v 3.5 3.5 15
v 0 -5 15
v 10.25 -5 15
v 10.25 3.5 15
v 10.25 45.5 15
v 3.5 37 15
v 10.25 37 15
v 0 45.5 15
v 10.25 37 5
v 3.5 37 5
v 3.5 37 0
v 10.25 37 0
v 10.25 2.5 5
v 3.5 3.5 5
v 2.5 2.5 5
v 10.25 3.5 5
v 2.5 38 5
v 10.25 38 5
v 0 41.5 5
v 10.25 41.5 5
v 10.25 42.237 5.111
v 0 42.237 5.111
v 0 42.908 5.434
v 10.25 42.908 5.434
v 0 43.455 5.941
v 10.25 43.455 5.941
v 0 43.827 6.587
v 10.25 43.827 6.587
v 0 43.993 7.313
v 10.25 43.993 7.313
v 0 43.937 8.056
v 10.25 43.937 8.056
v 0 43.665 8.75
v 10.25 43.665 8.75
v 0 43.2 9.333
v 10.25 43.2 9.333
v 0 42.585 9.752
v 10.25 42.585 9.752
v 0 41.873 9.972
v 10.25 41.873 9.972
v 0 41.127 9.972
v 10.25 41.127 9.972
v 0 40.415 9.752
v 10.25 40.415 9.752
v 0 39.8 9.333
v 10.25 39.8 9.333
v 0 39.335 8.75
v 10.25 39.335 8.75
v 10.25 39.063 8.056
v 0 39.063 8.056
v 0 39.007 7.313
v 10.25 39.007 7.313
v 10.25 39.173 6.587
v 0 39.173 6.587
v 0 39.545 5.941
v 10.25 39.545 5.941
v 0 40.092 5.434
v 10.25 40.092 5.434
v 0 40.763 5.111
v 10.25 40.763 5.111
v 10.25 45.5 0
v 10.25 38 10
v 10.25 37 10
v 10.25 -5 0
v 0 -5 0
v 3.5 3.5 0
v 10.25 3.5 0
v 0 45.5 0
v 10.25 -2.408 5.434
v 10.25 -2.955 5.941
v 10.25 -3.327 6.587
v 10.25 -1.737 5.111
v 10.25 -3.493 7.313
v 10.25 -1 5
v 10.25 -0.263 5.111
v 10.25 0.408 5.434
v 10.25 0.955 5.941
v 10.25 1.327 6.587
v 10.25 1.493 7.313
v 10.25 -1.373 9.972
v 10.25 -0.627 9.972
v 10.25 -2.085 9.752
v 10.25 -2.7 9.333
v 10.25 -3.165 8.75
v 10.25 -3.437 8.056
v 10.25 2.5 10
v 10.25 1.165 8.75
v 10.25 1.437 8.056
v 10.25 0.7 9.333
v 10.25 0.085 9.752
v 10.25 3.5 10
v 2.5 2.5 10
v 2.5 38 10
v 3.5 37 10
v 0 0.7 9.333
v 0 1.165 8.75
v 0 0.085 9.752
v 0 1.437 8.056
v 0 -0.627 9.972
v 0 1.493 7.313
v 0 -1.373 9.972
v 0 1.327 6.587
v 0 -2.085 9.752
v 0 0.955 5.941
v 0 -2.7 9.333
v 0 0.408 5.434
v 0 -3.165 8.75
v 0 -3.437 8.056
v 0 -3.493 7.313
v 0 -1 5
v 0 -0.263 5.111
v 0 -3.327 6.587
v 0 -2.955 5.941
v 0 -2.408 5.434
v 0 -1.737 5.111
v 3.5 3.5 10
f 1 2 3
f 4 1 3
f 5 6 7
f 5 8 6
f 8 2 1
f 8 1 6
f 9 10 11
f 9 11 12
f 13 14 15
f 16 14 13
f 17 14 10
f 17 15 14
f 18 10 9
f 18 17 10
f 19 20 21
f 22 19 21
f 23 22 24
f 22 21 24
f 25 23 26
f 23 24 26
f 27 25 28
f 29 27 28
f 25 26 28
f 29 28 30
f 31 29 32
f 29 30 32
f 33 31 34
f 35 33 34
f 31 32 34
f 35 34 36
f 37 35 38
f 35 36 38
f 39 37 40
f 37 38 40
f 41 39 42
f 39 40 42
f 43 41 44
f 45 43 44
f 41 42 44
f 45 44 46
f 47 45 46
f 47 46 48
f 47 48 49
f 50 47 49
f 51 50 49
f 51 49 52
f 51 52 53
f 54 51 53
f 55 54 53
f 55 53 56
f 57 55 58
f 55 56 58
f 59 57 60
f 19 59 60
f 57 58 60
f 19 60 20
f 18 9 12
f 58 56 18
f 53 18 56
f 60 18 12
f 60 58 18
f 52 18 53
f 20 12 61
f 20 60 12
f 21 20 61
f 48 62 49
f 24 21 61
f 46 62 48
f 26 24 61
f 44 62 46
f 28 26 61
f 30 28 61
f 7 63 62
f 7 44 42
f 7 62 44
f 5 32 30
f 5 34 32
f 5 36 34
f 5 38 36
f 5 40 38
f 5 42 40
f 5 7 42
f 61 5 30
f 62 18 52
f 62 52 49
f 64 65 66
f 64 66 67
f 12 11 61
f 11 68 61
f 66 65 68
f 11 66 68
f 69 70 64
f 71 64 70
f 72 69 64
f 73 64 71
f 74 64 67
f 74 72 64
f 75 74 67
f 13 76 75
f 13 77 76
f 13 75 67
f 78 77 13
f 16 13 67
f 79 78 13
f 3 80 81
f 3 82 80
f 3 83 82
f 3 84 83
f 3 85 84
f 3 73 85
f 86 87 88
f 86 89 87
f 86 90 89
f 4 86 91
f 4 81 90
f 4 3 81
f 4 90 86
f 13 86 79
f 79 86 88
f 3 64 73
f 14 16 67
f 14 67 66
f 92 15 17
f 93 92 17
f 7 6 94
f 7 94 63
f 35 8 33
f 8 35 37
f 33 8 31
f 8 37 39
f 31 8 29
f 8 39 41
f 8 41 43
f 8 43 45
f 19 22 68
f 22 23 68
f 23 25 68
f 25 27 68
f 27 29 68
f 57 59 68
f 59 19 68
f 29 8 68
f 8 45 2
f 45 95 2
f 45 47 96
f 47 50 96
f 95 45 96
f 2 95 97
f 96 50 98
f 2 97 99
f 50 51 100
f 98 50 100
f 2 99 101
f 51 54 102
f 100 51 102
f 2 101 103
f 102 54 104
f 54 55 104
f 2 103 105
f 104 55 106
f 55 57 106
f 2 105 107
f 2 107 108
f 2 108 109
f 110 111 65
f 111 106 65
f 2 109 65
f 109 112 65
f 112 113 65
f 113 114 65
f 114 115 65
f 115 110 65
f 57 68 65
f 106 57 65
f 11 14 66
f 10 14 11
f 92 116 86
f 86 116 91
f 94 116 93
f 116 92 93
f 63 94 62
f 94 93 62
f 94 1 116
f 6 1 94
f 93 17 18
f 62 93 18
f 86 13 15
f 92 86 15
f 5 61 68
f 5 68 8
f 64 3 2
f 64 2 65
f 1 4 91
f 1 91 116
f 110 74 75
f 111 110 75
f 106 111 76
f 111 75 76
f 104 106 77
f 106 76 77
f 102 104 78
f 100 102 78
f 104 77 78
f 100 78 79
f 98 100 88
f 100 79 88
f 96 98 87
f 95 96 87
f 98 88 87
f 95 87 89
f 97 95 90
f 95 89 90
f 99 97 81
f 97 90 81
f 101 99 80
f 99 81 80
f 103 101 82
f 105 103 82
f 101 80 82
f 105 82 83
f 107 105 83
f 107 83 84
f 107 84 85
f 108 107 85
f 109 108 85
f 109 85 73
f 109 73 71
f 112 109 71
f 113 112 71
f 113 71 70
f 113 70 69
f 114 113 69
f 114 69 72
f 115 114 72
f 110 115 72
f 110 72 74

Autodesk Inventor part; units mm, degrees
ref_plane "YZ Plane" through (0, 0, 0) normal (1, 0, 0) x (0, 1, 0)
ref_plane "XZ Plane" through (0, 0, 0) normal (0, 1, 0) x (-1, 0, 0)
sketch "Sketch1" plane through (0, 0, 0) normal (0, 0, 1) x (1, 0, 0)
  line L0 (0, 0) -> (20.25, 0)
  line L1 (20.25, 0) -> (20.25, 40.5)
  line L2 (20.25, 40.5) -> (0, 40.5)
  line L3 (0, 40.5) -> (0, 0)
  dimension "d0" = 40.5
  dimension "d1" = 20.25
extrude "Extrusion1" add sketch "Sketch1" along normal blind 15
sketch "Sketch2" plane through (0, 0, 15) normal (0, 0, 1) x (1, 0, 0)
  line L0 (3.5, 37) -> (20.25, 37)
  line L1 (20.25, 37) -> (20.25, 3.5)
  line L2 (20.25, 3.5) -> (3.5, 3.5)
  line L3 (3.5, 3.5) -> (3.5, 37)
  line L4 (20.25, 0) -> (20.25, 40.5) projected
  line L5 (20.25, 40.5) -> (0, 40.5) projected
  line L6 (0, 0) -> (20.25, 0) projected
  dimension "d4" = 16.75
  dimension "d5" = 3.5
  dimension "d6" = 3.5
extrude "Extrusion2" cut sketch "Sketch2" against normal blind 15
ref_plane "Work Plane1" through (0, 0, 7.5) normal (0, 0, 1) x (1, 0, 0)
sketch "Sketch3" plane through (0, 0, 7.5) normal (0, 0, 1) x (1, 0, 0)
  line L0 (2.5, 38) -> (20.25, 38)
  line L1 (20.25, 38) -> (20.25, 2.5)
  line L2 (20.25, 2.5) -> (2.5, 2.5)
  line L3 (2.5, 2.5) -> (2.5, 38)
  line L4 (20.25, 0) -> (20.25, 3.5) projected
  line L5 (20.25, 40.5) -> (0, 40.5) projected
  line L6 (0, 0) -> (20.25, 0) projected
  line L7 (0, 40.5) -> (0, 0) projected
  dimension "d10" = 2.5
  dimension "d11" = 2.5
  dimension "d12" = 2.5
extrude "Extrusion3" cut sketch "Sketch3" along normal mid plane 5
sketch "Sketch4" plane through (20.25, 40.5, 15) normal (1, 0, 0) x (0, 0, -1)
  line L0 (15, 0) -> (0, 0) projected
  line L1 (0, 0) -> (15, 0)
  line L2 (15, 0) -> (15, 5)
  line L3 (15, 5) -> (0, 5)
  line L4 (0, 5) -> (0, 0)
  line L5 (15, -40.5) -> (15, -37) projected
  line L6 (15, -40.5) -> (0, -40.5)
  line L7 (0, -40.5) -> (0, -45.5)
  line L8 (0, -45.5) -> (15, -45.5)
  line L9 (15, -45.5) -> (15, -40.5)
  dimension "d15" = 5
  dimension "d16" = 5
extrude "Extrusion4" add sketch "Sketch4" against normal blind 20.25
sketch "Sketch5" plane through (0, 0, 15) normal (0, 0, 1) x (1, 0, 0)
  point P0 (0, 0)
sketch "Sketch6" plane through (20.25, 37, 10) normal (1, 0, 0) x (0, 0, -1)
  circle A0 centre (2.5, 4.5) radius 2.5
  circle A1 centre (2.5, -38) radius 2.5
  line L0 (10, 0) -> (10, 8.5) projected
  line L1 (0, 1) -> (5, 1) projected
  line L2 (10, 8.5) -> (-5, 8.5) projected
  line L3 (5, -34.5) -> (0, -34.5) projected
  point P0 (10, -37)
  dimension "d19" = 7.5
  dimension "d20" = 0
  dimension "d21" = 3.5
  dimension "d22" = 7.5
  dimension "d23" = 3.5
  dimension "d24" = 5
extrude "Extrusion5" cut sketch "Sketch6" against normal blind 50
sketch "Sketch7" plane through (0, 0, 15) normal (0, 0, 1) x (1, 0, 0)
  point P0 (0, 0)
sketch "Sketch8" plane through (0, 0, 15) normal (0, 0, 1) x (1, 0, 0)
  line L0 (20.25, 3.5) -> (20.25, -5) projected
  line L1 (10.25, 45.5) -> (20.25, 45.5)
  line L2 (20.25, 45.5) -> (20.25, -5)
  line L3 (20.25, -5) -> (10.25, -5)
  line L4 (10.25, -5) -> (10.25, 45.5)
  point P0 (0, 0)
  dimension "d27" = 10
extrude "Extrusion6" cut sketch "Sketch8" against normal through all
properties part number "standlower"
